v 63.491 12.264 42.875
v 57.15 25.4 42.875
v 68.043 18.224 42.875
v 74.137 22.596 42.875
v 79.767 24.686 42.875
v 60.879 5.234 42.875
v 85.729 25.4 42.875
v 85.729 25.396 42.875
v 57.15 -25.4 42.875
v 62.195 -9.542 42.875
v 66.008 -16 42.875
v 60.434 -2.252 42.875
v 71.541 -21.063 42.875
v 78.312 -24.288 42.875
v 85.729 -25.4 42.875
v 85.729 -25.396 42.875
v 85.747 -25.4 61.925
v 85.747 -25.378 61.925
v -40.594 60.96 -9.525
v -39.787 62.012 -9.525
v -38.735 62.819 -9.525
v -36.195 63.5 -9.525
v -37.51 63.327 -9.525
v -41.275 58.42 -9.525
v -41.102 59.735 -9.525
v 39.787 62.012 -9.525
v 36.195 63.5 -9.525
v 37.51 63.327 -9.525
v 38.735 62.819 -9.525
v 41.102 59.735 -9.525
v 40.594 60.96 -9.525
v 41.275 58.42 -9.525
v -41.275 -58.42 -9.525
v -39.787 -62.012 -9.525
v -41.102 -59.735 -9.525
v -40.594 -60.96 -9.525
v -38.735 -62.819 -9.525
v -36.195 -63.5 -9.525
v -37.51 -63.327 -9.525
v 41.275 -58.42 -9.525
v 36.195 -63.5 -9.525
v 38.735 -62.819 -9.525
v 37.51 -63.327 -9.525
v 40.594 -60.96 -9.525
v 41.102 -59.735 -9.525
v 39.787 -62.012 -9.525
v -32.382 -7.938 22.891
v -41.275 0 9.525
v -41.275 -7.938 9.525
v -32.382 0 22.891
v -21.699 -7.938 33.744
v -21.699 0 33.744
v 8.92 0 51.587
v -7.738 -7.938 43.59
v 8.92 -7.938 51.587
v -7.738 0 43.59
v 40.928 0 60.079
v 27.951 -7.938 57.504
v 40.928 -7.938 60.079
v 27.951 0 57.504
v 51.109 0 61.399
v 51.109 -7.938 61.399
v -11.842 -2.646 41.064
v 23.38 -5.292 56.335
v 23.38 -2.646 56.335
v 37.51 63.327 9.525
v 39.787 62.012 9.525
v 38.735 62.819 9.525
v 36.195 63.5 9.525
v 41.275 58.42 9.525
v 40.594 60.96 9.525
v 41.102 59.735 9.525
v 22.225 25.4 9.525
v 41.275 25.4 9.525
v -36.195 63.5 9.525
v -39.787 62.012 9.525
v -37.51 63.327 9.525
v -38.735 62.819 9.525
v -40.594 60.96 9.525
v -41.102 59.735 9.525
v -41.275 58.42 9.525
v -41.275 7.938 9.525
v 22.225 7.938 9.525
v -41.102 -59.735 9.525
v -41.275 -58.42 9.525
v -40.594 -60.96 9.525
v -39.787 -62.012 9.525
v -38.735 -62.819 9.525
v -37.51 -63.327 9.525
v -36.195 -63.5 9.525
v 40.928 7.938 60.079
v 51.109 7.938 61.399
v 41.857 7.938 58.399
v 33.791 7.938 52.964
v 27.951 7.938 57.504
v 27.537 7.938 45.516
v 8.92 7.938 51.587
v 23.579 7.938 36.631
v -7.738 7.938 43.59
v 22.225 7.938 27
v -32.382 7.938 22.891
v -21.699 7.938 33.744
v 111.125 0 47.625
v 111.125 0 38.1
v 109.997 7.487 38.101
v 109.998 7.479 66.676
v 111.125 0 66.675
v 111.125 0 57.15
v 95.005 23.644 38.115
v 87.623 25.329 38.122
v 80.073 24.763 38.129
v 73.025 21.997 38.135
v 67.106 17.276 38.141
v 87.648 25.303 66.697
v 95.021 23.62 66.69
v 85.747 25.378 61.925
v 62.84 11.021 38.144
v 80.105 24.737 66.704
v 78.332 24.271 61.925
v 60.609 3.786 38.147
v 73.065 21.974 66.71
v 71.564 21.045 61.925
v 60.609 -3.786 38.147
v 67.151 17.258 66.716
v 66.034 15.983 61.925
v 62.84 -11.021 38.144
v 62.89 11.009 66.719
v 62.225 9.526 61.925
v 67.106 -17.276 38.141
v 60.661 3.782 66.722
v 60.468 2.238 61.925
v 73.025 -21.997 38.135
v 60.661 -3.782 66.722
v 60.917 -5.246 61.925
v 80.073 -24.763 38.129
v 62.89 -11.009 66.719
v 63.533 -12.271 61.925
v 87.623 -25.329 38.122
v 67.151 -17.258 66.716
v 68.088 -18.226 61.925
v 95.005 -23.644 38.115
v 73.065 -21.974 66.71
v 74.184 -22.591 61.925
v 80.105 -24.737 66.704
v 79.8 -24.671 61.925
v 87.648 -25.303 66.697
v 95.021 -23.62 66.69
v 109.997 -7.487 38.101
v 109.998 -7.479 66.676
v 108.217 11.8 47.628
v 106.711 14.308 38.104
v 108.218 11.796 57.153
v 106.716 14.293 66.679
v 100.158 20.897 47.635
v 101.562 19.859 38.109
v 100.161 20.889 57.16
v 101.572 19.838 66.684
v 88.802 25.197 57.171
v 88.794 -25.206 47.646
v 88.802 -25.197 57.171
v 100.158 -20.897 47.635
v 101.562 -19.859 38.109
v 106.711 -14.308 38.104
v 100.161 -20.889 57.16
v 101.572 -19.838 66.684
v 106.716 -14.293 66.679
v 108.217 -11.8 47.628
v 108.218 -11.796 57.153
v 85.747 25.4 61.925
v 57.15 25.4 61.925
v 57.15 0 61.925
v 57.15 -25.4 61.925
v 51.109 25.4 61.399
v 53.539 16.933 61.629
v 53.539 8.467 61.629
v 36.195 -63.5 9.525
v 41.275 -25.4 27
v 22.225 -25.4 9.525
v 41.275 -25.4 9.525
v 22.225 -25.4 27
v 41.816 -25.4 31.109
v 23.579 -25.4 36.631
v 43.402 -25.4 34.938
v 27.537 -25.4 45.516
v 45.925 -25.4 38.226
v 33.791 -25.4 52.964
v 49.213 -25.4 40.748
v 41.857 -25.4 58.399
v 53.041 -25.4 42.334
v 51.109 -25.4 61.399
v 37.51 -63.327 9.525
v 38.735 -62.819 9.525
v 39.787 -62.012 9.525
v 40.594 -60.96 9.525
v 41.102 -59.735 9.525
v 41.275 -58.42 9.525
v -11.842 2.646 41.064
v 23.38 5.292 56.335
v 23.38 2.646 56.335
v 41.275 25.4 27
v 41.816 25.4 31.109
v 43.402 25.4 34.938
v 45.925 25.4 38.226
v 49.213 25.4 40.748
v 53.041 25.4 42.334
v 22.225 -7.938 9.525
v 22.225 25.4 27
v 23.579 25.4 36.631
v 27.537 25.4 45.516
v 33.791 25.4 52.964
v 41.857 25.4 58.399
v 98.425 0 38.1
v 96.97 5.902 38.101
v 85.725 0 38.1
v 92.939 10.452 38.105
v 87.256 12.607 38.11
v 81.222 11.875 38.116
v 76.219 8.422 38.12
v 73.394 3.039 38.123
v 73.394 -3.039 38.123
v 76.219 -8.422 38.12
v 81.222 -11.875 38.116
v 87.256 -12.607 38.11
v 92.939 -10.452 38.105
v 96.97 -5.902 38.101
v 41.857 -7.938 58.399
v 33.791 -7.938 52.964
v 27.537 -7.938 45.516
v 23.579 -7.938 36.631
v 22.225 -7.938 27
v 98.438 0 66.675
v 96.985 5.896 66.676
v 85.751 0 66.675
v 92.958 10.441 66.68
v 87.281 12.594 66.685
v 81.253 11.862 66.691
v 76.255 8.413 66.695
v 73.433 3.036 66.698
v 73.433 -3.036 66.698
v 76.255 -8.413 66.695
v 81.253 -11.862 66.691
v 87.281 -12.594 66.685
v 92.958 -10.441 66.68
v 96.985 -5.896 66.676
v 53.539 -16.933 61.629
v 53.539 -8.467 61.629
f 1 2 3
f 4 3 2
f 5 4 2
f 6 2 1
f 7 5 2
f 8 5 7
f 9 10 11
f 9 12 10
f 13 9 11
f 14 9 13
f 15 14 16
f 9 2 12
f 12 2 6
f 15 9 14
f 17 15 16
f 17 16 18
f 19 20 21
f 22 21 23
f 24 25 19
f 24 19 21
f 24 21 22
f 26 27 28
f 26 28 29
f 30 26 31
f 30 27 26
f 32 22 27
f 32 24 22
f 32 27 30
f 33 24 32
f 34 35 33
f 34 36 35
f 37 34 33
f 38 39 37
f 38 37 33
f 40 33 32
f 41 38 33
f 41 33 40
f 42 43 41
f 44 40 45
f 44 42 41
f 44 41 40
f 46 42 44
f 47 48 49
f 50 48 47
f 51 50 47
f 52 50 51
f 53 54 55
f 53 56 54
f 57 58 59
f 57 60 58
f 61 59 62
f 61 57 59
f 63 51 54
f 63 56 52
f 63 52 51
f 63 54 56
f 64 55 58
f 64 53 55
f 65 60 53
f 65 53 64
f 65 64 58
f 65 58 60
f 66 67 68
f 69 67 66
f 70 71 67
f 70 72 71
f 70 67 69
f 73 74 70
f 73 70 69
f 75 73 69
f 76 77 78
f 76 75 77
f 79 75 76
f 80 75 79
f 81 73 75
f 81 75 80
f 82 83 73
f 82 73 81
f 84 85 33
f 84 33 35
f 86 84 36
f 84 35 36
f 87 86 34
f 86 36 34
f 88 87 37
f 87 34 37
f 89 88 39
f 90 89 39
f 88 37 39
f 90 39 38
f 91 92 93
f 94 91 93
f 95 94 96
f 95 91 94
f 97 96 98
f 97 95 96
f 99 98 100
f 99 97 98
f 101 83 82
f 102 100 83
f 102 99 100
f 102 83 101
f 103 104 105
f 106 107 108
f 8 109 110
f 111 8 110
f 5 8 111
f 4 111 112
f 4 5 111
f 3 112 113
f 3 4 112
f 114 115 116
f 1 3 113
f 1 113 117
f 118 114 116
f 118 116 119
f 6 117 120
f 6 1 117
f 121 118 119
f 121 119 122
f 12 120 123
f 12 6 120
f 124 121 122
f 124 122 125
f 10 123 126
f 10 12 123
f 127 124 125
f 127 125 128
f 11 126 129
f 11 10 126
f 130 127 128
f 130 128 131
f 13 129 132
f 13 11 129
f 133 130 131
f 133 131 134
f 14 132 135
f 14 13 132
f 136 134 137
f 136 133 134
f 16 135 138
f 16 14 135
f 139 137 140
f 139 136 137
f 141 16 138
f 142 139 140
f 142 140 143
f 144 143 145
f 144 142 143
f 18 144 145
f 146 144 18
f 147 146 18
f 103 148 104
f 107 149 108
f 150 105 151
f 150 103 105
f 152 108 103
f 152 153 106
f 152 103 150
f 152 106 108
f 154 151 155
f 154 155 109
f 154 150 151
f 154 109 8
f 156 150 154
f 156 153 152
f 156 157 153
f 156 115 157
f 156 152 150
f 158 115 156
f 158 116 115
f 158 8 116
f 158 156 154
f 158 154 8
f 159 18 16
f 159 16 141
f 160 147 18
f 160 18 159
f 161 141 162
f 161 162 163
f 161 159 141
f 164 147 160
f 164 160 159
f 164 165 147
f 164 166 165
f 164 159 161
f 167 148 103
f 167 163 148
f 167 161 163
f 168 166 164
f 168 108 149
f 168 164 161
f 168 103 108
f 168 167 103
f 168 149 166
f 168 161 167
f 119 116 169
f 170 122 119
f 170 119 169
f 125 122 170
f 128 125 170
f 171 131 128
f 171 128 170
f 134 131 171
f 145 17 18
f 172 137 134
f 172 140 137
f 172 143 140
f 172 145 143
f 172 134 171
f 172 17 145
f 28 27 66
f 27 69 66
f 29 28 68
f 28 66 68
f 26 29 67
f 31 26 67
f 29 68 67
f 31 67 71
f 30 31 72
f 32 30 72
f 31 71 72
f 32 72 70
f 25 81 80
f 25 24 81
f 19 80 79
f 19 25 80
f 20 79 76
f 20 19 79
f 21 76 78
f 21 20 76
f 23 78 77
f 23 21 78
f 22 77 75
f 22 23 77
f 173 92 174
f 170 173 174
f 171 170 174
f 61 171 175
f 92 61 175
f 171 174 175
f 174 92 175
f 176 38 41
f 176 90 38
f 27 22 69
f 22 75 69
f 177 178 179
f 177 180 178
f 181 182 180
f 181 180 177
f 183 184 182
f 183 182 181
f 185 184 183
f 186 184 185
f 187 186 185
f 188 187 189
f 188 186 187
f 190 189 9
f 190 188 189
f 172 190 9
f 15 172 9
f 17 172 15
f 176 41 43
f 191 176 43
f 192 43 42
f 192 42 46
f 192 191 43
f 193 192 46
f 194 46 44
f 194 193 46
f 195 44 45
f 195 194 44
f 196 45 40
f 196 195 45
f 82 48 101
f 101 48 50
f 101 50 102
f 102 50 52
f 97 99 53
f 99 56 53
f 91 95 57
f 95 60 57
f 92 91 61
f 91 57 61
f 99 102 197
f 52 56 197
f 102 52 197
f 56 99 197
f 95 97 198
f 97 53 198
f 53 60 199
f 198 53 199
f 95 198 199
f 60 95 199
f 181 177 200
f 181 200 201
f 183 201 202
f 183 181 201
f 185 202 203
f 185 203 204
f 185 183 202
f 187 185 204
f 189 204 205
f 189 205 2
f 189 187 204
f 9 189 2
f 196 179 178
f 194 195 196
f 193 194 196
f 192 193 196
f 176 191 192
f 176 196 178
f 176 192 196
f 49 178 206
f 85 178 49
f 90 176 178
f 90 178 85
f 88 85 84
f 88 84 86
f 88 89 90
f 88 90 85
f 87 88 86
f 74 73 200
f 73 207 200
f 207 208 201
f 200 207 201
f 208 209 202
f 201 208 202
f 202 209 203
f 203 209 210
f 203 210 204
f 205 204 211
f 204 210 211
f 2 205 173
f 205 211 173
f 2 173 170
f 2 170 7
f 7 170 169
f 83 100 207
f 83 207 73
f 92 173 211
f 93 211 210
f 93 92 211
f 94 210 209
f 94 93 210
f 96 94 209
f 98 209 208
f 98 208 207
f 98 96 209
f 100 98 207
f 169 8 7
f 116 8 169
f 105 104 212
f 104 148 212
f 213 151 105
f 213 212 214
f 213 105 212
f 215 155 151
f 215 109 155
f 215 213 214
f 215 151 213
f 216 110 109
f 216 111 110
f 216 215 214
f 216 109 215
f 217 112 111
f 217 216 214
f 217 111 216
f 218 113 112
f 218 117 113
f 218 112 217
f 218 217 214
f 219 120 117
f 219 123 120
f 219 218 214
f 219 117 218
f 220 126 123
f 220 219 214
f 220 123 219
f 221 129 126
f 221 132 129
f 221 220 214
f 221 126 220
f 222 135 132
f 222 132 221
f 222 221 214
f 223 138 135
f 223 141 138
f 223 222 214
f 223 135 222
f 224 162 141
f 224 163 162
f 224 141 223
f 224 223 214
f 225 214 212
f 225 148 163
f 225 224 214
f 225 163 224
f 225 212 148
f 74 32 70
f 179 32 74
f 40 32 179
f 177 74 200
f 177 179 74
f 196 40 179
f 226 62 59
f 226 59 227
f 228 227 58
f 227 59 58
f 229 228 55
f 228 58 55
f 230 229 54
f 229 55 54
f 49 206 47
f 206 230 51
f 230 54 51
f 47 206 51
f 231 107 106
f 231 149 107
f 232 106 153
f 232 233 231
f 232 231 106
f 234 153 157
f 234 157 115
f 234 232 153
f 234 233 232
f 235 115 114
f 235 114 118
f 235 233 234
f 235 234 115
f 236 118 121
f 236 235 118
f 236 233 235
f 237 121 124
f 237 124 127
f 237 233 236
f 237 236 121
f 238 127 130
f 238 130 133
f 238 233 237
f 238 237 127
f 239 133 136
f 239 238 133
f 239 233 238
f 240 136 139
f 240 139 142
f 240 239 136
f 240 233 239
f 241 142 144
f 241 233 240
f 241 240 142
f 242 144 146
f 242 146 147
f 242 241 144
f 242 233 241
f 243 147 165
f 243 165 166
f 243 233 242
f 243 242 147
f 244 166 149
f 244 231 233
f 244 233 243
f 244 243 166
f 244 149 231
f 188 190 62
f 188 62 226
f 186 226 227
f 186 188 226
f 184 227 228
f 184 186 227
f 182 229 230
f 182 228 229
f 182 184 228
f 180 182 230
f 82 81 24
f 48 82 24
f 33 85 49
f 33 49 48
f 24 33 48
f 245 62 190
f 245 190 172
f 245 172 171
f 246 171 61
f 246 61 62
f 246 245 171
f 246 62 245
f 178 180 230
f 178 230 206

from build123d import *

# Parameters (mm, degrees)
F1_DEPTH = 63.5
F2_DEPTH = 25.4
F3_DEPTH = 7.9375
F5_DEPTH = 12.7
F6_R     = 5.08


with BuildPart() as f1:
    # F0 (on Front) → F1 (new body, symmetric)
    with BuildSketch(Plane.XZ):
        Polygon((-41.275, -9.525), (41.275, -9.525), (41.275, 9.525), (22.225, 9.525), (-41.275, 9.525), align=None)
    extrude(amount=F1_DEPTH, both=True)

    # F0 (on Front) → F2 (join, symmetric)
    with BuildSketch(Plane.XZ):
        with BuildLine():
            Line((22.225, 9.525), (41.275, 9.525))
            Line((41.275, 9.525), (41.275, 27.0002))
            ThreePointArc((41.275, 27.0002), (45.9246798487, 38.2255201513), (57.15, 42.8752))
            Line((57.15, 42.8752), (60.325, 42.8752))
            Line((60.325, 42.8752), (60.325, 61.9252))
            Line((60.325, 61.9252), (57.15, 61.9252))
            add(Edge.make_bspline(
                [(51.1085881946, 61.398702415), (53.7307154629, 61.6641570912), (55.7925510504, 61.8177418079), (57.15, 61.9252)],
                knots=[0.7544555653, 0.7544555653, 0.7544555653, 0.7544555653, 0.8556201459, 0.8556201459, 0.8556201459, 0.8556201459], degree=3))
            ThreePointArc((51.1085881946, 61.398702415), (30.4034868412, 49.4585984034), (22.225, 27.0002))
            Line((22.225, 27.0002), (22.225, 9.525))
        make_face()
        Polygon((60.325, 61.9252), (60.325, 42.8752), (85.729400427, 42.8752), (85.7469553221, 61.9252), align=None)
    extrude(amount=F2_DEPTH, both=True)

    # F0 (on Front) → F3 (join, symmetric)
    with BuildSketch(Plane.XZ):
        with BuildLine():
            add(Edge.make_bspline(
                [(-41.275, 9.525), (-19.1634568795, 51.2174255763), (31.5535374202, 59.4190198373), (51.1085881946, 61.398702415)],
                knots=[0, 0, 0, 0, 0.7544555653, 0.7544555653, 0.7544555653, 0.7544555653], degree=3))
            Line((-41.275, 9.525), (22.225, 9.525))
            Line((22.225, 9.525), (22.225, 27.0002))
            ThreePointArc((22.225, 27.0002), (30.4034868412, 49.4585984034), (51.1085881946, 61.398702415))
        make_face()
    extrude(amount=F3_DEPTH, both=True)

    # F0 (on Front) → F4 (revolve)
    with BuildSketch(Plane.XZ):
        Polygon((85.7469553221, 61.9252), (85.729400427, 42.8752), (85.725, 38.1), (111.125, 38.1), (111.125, 66.675), (85.7513323426, 66.675), align=None)
    revolve(axis=Axis((85.7381661713, 0, 52.3875), (0.0009215164, 0, 0.9999995754)))

    # F0 (on Front) → F5 (join, symmetric)
    with BuildSketch(Plane.XZ):
        with BuildLine():
            Line((22.225, 9.525), (41.275, 9.525))
            Line((41.275, 9.525), (41.275, 27.0002))
            ThreePointArc((41.275, 27.0002), (45.9246798487, 38.2255201513), (57.15, 42.8752))
            Line((57.15, 42.8752), (60.325, 42.8752))
            Line((60.325, 42.8752), (60.325, 61.9252))
            Line((60.325, 61.9252), (57.15, 61.9252))
            add(Edge.make_bspline(
                [(51.1085881946, 61.398702415), (53.7307154629, 61.6641570912), (55.7925510504, 61.8177418079), (57.15, 61.9252)],
                knots=[0.7544555653, 0.7544555653, 0.7544555653, 0.7544555653, 0.8556201459, 0.8556201459, 0.8556201459, 0.8556201459], degree=3))
            ThreePointArc((51.1085881946, 61.398702415), (30.4034868412, 49.4585984034), (22.225, 27.0002))
            Line((22.225, 27.0002), (22.225, 9.525))
        make_face()
    extrude(amount=F5_DEPTH, both=True)

    # F6
    f6_edges = [f1.edges().sort_by_distance(p)[0] for p in [
        (41.275, -63.5, 0),
        (-41.275, -63.5, 0),
        (41.275, 63.5, 0),
        (-41.275, 63.5, 0),
    ]]
    fillet(f6_edges, radius=F6_R)


solid = f1.part
